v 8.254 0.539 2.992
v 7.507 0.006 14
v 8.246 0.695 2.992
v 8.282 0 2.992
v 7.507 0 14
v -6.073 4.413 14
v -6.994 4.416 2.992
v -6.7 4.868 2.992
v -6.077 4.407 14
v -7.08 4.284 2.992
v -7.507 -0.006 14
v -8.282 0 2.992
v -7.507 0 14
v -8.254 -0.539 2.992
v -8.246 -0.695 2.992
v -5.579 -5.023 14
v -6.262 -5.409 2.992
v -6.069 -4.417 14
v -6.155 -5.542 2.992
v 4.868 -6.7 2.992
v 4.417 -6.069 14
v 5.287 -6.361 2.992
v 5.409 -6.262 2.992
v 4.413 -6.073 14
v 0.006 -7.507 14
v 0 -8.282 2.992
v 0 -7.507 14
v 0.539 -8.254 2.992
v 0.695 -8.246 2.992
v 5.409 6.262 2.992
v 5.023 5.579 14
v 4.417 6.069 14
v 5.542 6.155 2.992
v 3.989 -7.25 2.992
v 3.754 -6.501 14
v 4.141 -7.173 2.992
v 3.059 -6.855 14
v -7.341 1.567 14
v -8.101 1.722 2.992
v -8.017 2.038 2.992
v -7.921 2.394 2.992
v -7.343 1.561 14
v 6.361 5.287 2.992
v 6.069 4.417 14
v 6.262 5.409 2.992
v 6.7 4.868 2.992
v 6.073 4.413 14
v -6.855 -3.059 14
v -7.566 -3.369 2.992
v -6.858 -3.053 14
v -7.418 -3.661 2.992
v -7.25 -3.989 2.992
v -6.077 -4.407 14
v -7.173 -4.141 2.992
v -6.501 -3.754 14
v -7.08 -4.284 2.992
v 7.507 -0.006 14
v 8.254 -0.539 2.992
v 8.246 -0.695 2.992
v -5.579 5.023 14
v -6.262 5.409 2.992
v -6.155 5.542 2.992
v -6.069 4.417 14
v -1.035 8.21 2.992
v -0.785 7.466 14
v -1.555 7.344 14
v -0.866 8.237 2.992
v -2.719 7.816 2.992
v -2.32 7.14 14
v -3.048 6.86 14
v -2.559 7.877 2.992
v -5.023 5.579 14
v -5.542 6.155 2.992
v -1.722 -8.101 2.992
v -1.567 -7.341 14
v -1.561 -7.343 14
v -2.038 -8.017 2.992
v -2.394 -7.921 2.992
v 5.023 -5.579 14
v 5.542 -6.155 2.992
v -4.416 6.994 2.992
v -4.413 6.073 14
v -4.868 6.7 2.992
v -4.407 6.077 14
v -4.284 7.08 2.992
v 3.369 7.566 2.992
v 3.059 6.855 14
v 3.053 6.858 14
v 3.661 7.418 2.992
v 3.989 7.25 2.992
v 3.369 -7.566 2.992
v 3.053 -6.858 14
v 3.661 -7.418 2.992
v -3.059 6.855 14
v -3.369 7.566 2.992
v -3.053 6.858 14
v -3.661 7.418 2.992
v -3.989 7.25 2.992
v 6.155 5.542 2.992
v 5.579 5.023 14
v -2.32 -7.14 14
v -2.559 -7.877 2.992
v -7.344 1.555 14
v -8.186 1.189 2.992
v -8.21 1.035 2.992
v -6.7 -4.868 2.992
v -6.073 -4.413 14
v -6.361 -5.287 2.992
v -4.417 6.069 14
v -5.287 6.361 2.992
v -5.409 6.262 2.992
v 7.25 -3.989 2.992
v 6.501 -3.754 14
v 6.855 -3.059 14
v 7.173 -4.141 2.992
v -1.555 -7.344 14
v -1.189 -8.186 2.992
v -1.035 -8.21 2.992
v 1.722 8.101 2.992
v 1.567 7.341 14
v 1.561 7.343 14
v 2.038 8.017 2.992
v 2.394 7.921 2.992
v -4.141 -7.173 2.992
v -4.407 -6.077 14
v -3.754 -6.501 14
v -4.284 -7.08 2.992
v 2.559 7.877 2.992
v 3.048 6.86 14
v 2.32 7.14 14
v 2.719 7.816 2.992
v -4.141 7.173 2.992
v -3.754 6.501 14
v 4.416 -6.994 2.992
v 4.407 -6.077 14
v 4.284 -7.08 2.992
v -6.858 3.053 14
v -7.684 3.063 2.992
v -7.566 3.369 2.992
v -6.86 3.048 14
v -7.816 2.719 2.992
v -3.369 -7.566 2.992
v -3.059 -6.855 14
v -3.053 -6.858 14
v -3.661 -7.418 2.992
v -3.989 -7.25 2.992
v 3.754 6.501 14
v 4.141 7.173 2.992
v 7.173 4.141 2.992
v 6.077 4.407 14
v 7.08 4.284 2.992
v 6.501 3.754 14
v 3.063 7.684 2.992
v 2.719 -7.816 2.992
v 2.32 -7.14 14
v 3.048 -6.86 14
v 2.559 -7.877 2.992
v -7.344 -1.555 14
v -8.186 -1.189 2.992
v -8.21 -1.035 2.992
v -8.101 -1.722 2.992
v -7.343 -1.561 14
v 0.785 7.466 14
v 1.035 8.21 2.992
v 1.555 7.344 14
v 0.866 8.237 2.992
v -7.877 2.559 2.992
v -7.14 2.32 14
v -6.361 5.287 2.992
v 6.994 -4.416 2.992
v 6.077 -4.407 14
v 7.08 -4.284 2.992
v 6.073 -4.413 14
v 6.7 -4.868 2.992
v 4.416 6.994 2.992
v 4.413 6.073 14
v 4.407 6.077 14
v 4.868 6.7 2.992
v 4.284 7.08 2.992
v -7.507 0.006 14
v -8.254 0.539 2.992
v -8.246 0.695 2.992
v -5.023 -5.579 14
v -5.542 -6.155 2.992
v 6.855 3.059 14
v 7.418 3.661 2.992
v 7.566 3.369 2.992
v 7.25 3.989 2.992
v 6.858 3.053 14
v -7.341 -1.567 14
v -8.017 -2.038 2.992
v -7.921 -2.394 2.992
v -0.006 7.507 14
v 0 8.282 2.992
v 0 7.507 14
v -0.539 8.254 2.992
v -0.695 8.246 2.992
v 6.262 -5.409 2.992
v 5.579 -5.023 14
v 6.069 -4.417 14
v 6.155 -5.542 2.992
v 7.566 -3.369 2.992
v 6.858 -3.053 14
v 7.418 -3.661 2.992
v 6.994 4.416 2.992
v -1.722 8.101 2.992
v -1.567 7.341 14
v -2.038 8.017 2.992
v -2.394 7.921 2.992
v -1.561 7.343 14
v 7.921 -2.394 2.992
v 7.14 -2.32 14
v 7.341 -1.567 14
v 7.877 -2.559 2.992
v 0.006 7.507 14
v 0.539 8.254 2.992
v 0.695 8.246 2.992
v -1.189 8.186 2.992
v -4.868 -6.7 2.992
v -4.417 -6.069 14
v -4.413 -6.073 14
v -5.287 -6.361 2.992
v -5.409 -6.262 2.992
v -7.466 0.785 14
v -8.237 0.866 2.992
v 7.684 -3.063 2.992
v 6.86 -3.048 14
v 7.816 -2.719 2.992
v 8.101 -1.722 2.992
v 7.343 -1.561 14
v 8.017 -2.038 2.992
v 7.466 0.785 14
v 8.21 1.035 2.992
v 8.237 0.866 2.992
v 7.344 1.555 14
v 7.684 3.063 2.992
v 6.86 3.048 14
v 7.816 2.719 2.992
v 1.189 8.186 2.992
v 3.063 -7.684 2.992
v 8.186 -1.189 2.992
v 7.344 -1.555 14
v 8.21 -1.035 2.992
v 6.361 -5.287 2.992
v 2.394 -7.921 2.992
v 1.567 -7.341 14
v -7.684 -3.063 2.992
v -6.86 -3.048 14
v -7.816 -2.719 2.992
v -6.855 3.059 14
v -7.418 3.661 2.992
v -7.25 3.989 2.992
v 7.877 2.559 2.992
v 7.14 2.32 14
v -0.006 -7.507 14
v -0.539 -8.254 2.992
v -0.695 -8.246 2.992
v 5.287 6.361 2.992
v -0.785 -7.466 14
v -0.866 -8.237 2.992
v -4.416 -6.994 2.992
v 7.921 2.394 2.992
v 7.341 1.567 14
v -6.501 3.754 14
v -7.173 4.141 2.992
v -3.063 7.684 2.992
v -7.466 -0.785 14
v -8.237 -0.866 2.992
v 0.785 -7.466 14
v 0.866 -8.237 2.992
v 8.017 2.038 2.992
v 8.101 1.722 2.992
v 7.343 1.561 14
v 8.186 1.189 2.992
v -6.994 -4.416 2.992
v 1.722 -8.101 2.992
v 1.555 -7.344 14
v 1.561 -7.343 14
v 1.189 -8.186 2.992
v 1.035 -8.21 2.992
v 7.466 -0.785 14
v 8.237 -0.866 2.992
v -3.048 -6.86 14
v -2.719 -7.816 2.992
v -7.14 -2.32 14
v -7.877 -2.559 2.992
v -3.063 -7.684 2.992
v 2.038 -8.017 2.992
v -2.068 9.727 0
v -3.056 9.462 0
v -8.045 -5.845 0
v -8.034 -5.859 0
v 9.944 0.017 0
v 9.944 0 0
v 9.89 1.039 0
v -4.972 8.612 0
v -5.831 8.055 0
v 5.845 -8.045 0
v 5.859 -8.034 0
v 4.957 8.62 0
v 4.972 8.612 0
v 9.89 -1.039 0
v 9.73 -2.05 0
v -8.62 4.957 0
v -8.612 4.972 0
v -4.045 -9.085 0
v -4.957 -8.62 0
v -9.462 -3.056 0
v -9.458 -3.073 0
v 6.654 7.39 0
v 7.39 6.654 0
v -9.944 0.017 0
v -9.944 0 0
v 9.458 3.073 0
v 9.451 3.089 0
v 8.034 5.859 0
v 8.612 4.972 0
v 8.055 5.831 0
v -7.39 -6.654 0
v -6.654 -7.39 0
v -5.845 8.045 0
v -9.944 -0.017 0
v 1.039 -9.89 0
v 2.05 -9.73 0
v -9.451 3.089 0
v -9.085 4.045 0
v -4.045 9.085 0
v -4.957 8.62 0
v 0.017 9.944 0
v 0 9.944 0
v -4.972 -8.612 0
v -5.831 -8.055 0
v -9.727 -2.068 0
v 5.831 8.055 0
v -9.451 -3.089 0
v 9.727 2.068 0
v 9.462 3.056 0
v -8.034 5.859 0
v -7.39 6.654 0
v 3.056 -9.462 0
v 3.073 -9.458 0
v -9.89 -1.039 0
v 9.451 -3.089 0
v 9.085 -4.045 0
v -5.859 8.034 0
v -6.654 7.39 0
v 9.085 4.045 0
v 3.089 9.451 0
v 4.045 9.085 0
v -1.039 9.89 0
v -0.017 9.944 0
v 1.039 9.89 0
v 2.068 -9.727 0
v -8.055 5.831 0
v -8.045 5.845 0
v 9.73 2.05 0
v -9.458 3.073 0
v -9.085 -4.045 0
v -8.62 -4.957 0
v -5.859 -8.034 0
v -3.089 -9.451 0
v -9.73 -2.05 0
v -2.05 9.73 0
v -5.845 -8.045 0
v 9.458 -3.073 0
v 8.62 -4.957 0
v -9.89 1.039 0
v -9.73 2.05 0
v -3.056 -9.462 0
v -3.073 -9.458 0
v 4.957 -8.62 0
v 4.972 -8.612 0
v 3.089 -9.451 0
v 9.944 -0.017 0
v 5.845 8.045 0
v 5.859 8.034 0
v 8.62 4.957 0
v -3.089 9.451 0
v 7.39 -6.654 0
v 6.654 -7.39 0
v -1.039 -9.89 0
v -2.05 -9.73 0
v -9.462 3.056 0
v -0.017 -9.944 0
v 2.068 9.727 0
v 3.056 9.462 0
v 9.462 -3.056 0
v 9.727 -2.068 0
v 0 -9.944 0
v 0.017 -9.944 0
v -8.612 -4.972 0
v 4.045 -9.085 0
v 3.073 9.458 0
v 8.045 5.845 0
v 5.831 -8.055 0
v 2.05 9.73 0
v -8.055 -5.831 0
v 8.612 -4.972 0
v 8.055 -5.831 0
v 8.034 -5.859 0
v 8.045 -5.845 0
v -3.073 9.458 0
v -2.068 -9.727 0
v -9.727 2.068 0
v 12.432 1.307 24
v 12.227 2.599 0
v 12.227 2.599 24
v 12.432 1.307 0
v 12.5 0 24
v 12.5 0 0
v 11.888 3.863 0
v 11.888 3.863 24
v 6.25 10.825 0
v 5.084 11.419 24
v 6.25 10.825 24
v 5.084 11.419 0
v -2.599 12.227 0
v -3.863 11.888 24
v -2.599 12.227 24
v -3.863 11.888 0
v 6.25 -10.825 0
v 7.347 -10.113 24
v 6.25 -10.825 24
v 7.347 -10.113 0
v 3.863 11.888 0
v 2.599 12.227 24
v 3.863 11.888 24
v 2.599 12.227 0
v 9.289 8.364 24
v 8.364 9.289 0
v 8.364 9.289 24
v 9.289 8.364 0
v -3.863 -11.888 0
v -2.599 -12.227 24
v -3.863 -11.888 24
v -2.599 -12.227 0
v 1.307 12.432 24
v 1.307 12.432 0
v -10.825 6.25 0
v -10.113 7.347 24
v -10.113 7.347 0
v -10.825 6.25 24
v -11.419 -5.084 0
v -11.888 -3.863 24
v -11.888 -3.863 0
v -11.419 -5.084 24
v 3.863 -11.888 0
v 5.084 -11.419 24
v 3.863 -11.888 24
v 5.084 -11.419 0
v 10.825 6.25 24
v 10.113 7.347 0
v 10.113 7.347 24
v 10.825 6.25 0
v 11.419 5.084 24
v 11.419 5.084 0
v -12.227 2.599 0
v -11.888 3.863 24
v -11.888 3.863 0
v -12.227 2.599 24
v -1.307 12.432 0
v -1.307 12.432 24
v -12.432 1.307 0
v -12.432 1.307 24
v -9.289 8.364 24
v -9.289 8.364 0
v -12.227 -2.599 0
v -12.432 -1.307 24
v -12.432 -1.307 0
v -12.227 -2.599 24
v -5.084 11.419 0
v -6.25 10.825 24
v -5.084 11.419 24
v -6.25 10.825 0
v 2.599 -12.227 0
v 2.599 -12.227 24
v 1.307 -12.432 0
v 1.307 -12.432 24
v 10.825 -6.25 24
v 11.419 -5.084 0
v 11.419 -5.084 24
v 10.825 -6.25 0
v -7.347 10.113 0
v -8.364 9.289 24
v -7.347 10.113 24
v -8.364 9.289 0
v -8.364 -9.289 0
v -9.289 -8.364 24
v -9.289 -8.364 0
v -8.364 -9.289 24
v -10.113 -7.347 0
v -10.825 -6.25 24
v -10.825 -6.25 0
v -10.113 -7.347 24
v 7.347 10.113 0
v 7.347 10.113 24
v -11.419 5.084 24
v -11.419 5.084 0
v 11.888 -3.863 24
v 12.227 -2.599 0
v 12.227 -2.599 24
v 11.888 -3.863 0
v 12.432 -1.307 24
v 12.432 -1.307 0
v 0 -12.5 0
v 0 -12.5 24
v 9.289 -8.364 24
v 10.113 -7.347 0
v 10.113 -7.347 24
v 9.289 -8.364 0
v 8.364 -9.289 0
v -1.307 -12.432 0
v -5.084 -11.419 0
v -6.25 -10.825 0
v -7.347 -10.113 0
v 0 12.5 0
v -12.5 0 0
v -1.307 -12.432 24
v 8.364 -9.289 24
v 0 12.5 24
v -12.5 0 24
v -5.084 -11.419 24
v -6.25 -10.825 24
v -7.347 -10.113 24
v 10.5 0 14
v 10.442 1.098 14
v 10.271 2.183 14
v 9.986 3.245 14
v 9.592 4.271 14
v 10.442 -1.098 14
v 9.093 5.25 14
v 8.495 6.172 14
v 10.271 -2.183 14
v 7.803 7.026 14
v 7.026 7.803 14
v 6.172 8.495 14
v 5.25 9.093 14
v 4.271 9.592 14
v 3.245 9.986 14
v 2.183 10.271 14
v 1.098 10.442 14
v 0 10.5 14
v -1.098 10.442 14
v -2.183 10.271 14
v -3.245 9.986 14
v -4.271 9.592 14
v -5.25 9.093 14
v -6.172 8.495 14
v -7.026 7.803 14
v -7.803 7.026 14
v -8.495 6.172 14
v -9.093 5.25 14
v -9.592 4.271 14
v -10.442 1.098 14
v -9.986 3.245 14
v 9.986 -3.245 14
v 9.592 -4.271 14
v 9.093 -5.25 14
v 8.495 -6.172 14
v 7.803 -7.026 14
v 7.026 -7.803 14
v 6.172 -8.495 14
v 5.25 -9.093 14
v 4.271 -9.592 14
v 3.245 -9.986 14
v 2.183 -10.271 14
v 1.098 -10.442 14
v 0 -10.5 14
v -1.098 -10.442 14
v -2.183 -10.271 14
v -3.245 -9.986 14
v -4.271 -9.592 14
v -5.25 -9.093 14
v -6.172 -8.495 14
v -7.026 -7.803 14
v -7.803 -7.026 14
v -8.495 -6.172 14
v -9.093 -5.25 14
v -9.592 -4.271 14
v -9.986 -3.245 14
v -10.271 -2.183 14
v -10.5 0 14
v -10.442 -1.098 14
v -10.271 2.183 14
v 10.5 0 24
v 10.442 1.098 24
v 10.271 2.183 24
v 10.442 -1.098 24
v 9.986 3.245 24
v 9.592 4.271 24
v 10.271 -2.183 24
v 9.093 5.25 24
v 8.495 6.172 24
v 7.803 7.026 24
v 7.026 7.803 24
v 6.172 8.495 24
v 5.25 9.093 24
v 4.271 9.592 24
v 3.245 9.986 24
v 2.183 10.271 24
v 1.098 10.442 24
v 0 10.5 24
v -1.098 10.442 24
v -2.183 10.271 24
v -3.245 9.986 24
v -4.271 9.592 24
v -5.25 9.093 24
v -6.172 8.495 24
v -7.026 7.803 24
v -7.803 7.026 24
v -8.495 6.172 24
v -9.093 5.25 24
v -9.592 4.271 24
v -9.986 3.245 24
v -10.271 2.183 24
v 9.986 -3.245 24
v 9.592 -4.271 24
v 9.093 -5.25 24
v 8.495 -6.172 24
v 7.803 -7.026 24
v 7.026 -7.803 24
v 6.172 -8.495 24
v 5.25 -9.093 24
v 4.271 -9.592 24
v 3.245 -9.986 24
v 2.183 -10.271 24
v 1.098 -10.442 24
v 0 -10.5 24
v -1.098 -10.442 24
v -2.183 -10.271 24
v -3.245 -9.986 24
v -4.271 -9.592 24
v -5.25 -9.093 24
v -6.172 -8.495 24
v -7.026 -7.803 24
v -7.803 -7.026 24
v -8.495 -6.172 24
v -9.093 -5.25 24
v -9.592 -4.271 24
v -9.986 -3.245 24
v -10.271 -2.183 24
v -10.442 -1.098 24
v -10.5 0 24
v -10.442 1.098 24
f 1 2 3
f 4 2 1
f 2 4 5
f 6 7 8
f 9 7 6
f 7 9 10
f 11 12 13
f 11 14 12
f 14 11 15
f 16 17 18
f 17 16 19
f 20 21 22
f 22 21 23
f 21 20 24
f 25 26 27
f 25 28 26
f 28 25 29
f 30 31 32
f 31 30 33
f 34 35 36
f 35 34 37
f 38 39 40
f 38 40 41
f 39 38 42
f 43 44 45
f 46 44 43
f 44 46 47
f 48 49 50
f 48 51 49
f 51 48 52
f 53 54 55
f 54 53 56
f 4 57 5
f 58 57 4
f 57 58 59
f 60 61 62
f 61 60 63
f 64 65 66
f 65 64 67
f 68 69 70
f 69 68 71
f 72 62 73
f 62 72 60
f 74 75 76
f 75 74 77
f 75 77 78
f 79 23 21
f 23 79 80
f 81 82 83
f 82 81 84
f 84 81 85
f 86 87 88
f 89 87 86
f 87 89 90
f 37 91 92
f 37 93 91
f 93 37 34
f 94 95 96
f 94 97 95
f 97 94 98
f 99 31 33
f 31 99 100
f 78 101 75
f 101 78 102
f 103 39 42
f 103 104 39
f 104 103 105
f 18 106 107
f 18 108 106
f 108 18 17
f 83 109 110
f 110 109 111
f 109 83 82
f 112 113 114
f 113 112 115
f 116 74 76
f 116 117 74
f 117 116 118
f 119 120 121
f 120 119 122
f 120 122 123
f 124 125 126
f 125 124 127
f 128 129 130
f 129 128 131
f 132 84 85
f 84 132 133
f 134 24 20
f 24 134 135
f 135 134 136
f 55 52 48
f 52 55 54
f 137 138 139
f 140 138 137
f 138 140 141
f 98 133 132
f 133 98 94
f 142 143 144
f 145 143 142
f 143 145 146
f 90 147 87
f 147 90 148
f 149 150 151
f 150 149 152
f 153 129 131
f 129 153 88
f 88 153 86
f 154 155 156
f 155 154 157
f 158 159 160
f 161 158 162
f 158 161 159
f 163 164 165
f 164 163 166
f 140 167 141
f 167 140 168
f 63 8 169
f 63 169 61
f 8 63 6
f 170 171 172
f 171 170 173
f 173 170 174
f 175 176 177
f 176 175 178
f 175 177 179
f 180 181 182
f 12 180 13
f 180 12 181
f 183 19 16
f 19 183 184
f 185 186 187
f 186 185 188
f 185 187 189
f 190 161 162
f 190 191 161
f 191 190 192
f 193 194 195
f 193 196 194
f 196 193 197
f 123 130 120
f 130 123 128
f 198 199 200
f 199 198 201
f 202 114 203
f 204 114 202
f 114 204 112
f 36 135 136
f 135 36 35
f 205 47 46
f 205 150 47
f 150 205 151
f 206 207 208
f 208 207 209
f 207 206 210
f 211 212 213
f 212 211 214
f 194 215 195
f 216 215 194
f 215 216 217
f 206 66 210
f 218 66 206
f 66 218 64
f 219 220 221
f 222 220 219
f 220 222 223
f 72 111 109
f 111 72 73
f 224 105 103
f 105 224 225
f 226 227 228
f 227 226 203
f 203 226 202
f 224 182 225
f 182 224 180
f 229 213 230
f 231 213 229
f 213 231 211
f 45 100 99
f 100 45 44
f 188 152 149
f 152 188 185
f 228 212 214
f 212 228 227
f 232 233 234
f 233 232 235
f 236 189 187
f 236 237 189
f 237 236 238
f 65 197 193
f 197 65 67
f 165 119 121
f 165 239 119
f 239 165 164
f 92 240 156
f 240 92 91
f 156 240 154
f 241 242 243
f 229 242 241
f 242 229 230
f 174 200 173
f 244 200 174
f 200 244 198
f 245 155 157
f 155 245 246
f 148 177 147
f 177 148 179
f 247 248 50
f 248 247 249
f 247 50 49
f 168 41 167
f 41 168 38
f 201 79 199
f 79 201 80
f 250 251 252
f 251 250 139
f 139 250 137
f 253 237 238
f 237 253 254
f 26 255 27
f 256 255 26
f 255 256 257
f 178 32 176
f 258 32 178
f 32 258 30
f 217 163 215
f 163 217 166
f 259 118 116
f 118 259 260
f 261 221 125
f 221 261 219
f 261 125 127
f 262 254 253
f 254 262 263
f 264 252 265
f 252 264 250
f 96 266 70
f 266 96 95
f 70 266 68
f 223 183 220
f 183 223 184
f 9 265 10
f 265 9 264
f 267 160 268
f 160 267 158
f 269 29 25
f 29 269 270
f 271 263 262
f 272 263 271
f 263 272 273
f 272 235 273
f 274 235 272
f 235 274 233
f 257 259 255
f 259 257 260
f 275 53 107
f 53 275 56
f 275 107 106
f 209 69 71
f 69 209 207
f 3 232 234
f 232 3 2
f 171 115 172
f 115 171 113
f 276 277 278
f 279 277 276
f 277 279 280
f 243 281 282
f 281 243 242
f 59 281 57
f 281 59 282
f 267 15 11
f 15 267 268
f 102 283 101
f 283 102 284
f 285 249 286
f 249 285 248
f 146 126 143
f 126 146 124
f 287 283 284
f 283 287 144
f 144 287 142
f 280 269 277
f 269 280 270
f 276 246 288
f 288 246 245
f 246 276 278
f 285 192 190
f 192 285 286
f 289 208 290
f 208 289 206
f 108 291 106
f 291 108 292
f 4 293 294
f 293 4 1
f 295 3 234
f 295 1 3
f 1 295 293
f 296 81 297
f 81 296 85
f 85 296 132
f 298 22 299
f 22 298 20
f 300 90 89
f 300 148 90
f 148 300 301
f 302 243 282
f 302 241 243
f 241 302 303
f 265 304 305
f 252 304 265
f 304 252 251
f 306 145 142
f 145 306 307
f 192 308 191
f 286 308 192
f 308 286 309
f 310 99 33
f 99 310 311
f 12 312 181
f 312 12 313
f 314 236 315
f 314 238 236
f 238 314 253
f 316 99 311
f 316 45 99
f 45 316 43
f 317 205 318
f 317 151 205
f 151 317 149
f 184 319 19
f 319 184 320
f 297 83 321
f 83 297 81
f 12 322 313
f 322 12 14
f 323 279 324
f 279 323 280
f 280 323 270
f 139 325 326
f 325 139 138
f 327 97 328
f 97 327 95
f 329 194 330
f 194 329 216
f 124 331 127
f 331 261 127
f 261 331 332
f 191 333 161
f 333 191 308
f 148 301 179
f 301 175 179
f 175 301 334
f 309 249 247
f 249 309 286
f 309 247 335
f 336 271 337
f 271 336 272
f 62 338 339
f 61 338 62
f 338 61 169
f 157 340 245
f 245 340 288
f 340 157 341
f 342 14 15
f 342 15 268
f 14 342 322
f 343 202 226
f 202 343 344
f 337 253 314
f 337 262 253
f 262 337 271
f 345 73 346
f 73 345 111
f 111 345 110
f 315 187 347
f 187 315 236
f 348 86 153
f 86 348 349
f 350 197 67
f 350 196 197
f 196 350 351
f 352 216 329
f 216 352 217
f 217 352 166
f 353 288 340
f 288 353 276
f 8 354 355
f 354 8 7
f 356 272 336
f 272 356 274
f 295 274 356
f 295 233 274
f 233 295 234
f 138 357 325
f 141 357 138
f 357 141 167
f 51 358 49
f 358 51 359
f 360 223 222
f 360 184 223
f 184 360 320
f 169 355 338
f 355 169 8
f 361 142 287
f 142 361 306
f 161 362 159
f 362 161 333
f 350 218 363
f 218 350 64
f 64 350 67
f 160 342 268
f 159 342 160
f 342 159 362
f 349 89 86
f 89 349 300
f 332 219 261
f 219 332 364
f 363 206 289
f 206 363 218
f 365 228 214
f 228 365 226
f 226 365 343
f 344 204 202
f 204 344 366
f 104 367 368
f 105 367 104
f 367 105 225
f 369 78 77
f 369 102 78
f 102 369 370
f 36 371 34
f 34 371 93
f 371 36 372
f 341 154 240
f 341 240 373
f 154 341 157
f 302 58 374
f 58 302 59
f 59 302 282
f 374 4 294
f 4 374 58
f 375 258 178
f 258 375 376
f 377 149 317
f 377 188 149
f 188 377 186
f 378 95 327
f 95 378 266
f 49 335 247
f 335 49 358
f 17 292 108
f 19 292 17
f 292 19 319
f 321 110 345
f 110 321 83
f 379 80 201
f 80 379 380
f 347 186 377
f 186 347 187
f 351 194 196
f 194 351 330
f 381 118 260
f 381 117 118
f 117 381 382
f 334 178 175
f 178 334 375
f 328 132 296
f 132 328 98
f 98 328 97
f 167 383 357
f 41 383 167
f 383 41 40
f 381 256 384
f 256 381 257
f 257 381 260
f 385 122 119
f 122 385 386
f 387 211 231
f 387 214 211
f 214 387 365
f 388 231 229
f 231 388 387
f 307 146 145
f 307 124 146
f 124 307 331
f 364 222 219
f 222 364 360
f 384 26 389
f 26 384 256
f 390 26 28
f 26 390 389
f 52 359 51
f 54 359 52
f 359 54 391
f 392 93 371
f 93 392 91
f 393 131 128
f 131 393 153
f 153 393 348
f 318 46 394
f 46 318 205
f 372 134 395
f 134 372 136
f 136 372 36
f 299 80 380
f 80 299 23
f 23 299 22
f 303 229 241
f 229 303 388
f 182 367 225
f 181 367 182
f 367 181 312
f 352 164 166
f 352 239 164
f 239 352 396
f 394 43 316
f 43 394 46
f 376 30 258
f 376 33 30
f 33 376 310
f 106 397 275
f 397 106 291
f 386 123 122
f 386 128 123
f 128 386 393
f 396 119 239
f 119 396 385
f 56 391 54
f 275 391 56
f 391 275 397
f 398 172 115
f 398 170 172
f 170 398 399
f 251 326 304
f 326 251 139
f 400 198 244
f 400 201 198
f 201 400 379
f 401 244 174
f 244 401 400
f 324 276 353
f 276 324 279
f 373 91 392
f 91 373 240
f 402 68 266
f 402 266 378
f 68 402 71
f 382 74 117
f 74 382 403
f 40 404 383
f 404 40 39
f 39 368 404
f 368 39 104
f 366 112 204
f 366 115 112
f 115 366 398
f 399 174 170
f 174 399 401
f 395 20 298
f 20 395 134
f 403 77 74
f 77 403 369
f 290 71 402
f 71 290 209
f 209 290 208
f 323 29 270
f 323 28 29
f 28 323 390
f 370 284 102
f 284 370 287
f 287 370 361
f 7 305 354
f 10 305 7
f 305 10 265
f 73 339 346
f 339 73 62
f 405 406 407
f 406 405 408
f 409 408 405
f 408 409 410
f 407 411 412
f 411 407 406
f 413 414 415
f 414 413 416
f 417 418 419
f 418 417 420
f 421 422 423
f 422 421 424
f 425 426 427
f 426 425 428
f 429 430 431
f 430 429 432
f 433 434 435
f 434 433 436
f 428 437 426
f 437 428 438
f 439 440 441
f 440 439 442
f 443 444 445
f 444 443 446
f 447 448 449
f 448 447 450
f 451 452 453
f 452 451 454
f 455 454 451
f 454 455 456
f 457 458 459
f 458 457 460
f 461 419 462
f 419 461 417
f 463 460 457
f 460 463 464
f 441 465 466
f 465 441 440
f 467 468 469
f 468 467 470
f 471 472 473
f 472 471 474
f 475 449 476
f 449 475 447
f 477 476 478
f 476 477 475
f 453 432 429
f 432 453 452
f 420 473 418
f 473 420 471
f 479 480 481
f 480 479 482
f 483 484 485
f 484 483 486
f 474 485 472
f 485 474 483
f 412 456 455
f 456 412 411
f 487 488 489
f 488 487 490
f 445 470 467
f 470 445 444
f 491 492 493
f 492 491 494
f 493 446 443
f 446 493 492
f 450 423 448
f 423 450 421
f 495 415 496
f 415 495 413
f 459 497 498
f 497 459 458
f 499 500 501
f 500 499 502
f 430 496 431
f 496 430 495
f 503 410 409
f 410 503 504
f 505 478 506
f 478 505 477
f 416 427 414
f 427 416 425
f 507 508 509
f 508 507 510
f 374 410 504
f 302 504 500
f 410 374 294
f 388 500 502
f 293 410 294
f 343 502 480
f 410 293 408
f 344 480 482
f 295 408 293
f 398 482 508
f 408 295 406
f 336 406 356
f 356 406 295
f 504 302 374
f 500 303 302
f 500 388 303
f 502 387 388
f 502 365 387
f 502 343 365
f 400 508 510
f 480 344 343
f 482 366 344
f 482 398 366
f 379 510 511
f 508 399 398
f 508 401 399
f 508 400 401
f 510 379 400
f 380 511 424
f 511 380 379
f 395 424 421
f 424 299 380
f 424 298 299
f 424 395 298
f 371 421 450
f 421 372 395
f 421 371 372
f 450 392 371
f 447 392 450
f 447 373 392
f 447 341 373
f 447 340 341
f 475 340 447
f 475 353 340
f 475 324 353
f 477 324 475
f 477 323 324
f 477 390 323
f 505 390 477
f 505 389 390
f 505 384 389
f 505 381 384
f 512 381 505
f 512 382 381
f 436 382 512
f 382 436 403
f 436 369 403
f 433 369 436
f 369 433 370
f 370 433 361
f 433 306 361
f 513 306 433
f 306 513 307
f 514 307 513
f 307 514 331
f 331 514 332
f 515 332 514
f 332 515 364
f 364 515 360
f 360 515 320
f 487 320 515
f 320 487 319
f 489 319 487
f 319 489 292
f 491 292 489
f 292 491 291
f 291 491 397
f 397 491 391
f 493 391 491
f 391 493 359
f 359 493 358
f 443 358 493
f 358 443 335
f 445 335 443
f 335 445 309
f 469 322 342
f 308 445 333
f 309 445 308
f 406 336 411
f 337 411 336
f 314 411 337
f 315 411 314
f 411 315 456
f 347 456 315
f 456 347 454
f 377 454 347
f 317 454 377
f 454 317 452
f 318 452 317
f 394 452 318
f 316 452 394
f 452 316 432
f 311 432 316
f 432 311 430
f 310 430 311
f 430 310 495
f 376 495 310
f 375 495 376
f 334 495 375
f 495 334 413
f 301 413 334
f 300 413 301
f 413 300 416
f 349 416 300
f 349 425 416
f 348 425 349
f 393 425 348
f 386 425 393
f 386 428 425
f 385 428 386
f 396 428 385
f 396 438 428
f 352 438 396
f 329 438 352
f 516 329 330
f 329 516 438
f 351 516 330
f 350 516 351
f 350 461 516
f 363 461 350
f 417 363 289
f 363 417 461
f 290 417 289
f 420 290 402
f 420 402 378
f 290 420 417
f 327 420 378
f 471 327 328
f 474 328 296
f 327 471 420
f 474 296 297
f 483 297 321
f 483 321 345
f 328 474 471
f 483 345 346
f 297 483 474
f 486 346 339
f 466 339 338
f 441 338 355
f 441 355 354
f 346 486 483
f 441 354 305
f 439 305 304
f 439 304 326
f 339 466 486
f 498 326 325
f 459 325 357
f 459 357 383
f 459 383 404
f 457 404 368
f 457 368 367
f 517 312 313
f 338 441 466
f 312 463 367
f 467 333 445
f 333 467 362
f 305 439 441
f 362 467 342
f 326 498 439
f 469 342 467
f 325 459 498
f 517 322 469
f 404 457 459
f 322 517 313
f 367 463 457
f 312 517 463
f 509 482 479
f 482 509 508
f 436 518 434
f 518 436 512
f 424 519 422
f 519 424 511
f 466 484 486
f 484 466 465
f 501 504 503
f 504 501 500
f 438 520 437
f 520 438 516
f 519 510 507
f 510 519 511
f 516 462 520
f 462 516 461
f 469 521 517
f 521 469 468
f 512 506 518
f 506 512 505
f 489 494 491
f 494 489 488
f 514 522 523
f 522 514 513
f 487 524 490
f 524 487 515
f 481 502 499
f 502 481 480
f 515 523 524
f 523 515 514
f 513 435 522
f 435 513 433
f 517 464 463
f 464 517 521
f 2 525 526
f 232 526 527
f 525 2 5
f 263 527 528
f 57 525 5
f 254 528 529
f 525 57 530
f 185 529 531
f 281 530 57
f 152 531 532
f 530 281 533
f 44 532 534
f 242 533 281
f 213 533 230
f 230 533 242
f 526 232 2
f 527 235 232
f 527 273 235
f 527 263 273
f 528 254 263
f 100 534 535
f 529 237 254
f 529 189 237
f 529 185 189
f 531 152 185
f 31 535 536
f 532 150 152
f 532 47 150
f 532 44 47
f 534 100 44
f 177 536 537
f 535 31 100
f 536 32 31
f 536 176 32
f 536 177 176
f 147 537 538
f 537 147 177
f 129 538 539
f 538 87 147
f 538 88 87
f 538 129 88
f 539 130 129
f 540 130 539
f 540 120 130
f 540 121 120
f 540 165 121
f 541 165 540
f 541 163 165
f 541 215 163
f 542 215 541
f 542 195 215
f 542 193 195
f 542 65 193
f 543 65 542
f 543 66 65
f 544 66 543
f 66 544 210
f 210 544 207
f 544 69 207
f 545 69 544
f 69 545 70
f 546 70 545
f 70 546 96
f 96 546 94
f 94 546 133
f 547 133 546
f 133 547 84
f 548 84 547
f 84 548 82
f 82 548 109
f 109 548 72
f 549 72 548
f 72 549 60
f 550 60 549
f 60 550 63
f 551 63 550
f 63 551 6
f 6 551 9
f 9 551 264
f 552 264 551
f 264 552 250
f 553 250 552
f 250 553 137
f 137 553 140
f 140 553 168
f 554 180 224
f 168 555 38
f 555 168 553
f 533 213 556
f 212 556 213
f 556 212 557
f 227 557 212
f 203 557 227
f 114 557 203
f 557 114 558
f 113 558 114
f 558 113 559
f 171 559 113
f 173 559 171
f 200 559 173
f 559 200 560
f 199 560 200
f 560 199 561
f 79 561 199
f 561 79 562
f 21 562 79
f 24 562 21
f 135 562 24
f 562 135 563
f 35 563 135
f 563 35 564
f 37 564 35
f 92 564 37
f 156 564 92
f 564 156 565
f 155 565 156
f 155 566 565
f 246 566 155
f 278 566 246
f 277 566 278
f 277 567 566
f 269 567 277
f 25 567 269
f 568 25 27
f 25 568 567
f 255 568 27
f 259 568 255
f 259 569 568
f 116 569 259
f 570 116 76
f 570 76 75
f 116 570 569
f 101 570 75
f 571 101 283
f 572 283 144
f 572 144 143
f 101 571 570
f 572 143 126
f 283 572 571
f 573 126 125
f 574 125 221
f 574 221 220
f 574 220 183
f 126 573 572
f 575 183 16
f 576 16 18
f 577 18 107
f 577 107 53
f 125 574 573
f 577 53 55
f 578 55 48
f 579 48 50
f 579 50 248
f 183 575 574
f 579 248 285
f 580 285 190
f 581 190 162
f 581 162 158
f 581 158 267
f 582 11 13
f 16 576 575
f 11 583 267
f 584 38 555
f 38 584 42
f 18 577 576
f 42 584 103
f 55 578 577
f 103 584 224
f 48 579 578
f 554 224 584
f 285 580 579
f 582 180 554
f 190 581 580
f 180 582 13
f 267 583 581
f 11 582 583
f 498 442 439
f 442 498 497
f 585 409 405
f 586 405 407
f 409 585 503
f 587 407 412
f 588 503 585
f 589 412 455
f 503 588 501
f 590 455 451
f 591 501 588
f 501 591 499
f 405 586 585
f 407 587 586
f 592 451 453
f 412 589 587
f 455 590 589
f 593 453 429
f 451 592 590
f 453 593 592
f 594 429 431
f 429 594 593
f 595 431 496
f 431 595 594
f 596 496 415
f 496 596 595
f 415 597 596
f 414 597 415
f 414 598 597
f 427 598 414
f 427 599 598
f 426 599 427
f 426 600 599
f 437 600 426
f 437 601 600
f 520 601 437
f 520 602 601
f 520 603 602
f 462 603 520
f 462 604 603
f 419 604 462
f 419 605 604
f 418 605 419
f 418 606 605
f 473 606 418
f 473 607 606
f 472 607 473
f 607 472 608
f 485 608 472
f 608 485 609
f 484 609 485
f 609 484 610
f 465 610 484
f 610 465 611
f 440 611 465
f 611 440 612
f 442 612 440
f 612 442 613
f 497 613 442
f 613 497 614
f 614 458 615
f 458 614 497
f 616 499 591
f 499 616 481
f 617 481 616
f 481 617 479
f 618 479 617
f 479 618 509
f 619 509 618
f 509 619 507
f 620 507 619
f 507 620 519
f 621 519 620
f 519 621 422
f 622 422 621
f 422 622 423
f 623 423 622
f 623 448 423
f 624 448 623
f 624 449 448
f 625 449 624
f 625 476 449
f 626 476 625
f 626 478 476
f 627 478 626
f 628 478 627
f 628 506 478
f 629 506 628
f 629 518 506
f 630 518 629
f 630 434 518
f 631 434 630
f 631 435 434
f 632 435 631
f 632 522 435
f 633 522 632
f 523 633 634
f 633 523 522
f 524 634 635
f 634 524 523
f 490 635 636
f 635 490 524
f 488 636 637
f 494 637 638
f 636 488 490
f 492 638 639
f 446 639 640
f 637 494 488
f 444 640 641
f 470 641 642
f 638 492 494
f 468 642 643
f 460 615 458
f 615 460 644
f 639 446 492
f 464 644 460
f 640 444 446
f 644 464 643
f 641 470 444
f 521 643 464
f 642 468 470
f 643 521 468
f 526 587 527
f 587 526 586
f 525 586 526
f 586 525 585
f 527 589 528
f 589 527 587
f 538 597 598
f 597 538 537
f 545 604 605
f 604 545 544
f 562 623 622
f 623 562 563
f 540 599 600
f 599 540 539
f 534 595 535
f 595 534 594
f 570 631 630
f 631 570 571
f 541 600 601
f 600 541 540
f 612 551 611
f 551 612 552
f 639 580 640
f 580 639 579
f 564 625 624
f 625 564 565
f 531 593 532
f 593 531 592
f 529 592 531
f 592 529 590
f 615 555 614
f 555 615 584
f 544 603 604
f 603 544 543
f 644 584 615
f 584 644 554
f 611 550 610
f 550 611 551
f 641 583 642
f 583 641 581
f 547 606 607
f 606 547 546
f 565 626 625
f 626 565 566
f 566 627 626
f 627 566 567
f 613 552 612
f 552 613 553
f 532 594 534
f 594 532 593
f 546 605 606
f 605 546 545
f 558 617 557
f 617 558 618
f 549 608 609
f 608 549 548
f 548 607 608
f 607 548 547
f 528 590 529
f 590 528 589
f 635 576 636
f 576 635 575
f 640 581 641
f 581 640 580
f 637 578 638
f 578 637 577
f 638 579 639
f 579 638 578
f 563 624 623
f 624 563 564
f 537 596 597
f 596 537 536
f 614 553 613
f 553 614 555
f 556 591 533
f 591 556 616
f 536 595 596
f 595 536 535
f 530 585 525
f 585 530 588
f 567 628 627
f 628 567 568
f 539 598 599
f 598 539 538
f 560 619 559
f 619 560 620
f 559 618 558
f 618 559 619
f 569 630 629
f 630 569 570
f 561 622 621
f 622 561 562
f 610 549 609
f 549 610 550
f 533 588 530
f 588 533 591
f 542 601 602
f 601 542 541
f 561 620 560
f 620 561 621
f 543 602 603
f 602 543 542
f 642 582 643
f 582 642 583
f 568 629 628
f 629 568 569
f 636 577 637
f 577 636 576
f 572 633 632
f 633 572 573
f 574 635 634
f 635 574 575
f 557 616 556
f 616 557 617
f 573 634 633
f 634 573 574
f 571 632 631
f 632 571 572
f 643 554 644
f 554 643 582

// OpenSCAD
thermarest_outer=15;
thermarest_hight=14;
thermarest_con=1;

exped_outer=21;
exped_hight=10;

wall=2;
easy_fit=1.5;
$fn=60;

outer_outer = max(thermarest_outer,exped_outer);

difference(){
cylinder(r=outer_outer/2+wall,h=thermarest_hight);
    translate([0,0,-0.1]){
cylinder(r1=thermarest_outer/2+thermarest_con,r2=thermarest_outer/2,h=thermarest_hight+0.2);
        cylinder(r1=thermarest_outer/2+thermarest_con+easy_fit,r2=thermarest_outer/2,h=easy_fit*3);
    }
}
translate([0,0,thermarest_hight]){
difference(){
cylinder(r=outer_outer/2+wall,h=exped_hight);
    translate([0,0,-0.1]){
cylinder(r=exped_outer/2,h=exped_hight+0.2);
    }
}
}
